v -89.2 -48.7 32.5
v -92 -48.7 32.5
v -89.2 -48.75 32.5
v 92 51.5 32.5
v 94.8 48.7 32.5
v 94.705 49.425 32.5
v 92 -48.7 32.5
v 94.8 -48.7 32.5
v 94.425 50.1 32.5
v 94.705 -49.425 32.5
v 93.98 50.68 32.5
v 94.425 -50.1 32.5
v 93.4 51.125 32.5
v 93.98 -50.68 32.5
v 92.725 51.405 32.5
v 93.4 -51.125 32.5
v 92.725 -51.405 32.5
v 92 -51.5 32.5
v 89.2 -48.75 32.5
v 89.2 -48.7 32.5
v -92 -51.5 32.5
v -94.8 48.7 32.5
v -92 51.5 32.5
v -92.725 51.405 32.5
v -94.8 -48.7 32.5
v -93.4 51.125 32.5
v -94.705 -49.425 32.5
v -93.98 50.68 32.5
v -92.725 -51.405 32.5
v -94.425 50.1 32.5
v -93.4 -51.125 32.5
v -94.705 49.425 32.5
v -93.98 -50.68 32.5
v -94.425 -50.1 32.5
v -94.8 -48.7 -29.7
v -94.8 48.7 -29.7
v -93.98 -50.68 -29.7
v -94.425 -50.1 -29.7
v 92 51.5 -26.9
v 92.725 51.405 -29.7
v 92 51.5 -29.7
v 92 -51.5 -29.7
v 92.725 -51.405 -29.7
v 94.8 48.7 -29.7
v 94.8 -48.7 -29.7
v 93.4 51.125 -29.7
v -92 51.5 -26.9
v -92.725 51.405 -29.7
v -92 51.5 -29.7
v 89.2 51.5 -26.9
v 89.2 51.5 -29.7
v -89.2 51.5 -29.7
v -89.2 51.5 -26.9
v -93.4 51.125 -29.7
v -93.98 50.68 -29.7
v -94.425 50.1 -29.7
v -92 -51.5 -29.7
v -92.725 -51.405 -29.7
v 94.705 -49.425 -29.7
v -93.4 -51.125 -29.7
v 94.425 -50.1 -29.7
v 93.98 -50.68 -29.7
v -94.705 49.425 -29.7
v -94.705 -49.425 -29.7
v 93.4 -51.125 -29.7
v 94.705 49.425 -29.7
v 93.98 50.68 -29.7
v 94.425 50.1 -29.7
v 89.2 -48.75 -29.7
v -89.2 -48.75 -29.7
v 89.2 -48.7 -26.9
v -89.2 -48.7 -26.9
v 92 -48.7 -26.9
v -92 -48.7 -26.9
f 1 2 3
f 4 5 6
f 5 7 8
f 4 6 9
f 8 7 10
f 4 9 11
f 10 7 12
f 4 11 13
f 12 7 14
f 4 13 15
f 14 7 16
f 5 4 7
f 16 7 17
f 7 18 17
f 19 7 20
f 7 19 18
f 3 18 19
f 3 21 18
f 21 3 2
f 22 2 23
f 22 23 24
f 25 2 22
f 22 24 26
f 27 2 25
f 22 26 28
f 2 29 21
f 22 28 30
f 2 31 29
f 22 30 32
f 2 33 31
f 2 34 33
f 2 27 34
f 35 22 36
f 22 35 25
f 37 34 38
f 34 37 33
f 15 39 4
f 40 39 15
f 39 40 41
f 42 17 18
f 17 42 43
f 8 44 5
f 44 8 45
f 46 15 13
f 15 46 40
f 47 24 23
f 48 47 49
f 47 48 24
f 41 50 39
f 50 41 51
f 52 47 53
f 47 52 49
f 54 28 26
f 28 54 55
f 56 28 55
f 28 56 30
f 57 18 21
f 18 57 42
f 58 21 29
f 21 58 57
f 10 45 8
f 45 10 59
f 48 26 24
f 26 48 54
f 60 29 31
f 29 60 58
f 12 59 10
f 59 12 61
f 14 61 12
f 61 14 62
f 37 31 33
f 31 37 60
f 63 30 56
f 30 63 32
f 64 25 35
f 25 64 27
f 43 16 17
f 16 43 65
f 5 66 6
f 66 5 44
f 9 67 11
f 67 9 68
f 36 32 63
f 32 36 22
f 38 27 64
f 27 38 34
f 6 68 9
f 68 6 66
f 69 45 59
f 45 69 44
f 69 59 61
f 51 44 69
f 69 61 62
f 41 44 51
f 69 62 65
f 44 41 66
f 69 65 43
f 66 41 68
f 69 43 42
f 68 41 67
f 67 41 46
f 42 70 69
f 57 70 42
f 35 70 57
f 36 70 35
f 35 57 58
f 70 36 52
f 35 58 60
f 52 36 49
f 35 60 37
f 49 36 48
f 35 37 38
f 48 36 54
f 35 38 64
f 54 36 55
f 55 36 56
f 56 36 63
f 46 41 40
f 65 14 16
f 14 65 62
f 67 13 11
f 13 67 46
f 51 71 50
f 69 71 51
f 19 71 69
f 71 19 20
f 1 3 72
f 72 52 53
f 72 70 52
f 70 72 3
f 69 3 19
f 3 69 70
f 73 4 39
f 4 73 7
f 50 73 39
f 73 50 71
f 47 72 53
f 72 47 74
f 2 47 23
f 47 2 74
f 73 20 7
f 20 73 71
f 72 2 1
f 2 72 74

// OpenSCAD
thickness = 2.8; //mm
width = 184; //mm
depth = 65; //mm
height = 103; //mm
lip = thickness; //mm
$fn=24;

difference() {
  minkowski() {
    cube([width, height - 2 * thickness, depth - 2 * thickness], center = true);
    cylinder(r=thickness,h=thickness);
  }
  translate([0,thickness,0]) {
    cube([width-2*lip, height+0.1, depth + 0.01], center = true);
  }
  translate([0,thickness,lip*2]) {
    cube([width, height, depth], center = true);
  }
}
